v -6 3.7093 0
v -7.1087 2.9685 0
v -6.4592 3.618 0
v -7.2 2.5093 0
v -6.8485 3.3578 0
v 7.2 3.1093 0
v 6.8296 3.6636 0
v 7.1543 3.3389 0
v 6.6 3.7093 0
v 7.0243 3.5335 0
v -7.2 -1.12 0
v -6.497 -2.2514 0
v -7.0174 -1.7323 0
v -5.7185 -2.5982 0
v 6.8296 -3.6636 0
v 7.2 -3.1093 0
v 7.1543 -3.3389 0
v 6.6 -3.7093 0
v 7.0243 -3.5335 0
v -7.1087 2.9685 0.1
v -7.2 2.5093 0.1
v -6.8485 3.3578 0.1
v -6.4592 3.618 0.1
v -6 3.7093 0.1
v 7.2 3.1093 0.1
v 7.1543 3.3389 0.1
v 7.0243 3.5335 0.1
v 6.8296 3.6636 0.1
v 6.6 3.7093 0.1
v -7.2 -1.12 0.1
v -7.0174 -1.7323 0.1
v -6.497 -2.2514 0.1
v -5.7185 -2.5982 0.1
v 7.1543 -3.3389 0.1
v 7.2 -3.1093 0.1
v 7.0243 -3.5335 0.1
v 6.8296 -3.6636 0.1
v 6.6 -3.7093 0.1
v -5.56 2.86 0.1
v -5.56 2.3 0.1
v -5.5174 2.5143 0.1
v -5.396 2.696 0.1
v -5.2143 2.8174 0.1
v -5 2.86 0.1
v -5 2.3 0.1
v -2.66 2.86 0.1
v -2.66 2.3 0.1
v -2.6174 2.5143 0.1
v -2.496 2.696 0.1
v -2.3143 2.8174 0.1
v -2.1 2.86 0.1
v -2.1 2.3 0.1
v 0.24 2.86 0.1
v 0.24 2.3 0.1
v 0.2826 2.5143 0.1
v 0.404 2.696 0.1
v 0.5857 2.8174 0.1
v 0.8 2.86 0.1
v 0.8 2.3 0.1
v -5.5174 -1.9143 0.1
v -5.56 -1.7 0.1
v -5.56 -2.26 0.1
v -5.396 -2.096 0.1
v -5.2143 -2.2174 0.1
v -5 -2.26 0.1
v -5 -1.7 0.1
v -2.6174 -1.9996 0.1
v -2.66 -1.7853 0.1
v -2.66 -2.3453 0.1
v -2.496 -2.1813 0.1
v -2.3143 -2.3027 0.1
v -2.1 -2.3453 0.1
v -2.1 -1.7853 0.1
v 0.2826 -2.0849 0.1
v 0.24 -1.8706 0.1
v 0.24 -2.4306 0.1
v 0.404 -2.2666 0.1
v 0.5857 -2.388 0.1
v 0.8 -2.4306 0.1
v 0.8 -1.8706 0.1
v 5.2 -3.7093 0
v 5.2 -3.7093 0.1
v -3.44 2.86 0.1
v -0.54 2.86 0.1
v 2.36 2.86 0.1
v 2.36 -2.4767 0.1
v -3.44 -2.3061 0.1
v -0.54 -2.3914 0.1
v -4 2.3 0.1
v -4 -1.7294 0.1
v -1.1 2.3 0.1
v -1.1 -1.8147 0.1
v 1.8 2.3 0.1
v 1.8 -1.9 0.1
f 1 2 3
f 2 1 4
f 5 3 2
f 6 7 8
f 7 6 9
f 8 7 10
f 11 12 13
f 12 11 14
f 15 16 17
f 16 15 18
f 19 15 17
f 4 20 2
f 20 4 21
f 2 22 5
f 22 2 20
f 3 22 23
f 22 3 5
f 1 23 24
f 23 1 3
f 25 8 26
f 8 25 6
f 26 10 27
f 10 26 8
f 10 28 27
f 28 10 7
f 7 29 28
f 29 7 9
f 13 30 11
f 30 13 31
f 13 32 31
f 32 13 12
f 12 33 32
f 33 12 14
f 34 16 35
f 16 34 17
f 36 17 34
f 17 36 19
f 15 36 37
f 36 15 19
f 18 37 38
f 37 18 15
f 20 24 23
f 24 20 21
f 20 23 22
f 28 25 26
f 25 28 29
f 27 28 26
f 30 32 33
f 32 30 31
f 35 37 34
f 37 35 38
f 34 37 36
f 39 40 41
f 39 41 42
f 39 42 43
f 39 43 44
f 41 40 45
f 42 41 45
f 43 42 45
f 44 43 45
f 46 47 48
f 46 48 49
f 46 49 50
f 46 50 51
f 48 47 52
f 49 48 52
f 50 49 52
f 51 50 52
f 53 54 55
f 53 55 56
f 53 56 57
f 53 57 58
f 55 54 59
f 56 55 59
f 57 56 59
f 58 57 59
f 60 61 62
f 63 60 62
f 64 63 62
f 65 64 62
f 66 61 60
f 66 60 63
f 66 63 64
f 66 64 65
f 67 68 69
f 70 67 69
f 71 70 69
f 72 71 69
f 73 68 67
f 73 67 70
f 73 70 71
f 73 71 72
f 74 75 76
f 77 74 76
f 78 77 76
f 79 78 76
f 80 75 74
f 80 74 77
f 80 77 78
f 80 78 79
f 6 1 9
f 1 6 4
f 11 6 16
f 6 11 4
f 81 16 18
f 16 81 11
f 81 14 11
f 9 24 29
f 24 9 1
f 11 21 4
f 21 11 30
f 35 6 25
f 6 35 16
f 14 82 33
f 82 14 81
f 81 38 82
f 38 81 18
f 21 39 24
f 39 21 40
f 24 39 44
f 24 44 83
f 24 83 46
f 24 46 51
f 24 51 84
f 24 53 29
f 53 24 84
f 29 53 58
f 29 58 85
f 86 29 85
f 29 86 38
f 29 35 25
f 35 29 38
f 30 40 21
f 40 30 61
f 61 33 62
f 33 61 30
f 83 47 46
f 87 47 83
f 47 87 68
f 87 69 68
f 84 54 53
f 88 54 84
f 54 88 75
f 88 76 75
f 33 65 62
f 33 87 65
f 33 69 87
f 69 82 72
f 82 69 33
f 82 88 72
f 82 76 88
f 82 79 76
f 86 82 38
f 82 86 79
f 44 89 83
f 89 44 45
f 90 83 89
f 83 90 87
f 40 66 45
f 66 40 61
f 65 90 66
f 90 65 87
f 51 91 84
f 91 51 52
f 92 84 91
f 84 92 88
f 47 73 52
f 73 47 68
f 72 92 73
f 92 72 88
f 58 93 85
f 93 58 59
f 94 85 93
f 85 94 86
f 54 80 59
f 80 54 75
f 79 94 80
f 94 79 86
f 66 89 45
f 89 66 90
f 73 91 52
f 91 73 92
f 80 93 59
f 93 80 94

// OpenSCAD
// file: ../p/3-16cyli.scad
use <../lib.scad>
function ldraw_lib__3_16cyli() = [
// 0 Cylinder 0.1875
// 0 Name: 3-16cyli.dat
// 0 Author: Mark Kennedy [mkennedy]
// 0 !LDRAW_ORG Primitive UPDATE 2005-01
// 0 !LICENSE Licensed under CC BY 4.0 : see CAreadme.txt
// 
// 0 BFC CERTIFY CCW
  [0,"BFC","CERTIFY"],
  [0,"BFC","CCW"],
// 
// 0 !HISTORY 2004-03-02 [PTadmin] Official Update 2004-01
// 0 !HISTORY 2004-12-11 [nielsk] Recreated using Primitive Generator, Edge lines fixed, BFC changed to CCW
// 0 !HISTORY 2005-12-28 [PTadmin] Official Update 2005-01
// 0 !HISTORY 2007-06-24 [PTadmin] Header formatted for Contributor Agreement
// 0 !HISTORY 2008-07-01 [PTadmin] Official Update 2008-01
// 
// 
// 4 16 .9239 1 .3827 .9239 0 .3827 1 0 0 1 1 0
  [4,16,.9239,1,.3827,.9239,0,.3827,1,0,0,1,1,0],
// 4 16 .7071 1 .7071 .7071 0 .7071 .9239 0 .3827 .9239 1 .3827
  [4,16,.7071,1,.7071,.7071,0,.7071,.9239,0,.3827,.9239,1,.3827],
// 4 16 .3827 1 .9239 .3827 0 .9239 .7071 0 .7071 .7071 1 .7071
  [4,16,.3827,1,.9239,.3827,0,.9239,.7071,0,.7071,.7071,1,.7071],
// 5 24 1 1 0 1 0 0 1 1 -.4142 .9239 1 .3827
  [5,24,1,1,0,1,0,0,1,1,-.4142,.9239,1,.3827],
// 5 24 .9239 1 .3827 .9239 0 .3827 1 1 0 .7071 1 .7071
  [5,24,.9239,1,.3827,.9239,0,.3827,1,1,0,.7071,1,.7071],
// 5 24 .7071 1 .7071 .7071 0 .7071 .9239 1 .3827 .3827 1 .9239
  [5,24,.7071,1,.7071,.7071,0,.7071,.9239,1,.3827,.3827,1,.9239],
// 5 24 .3827 1 .9239 .3827 0 .9239 .7071 1 .7071 0 1 1.0824
  [5,24,.3827,1,.9239,.3827,0,.9239,.7071,1,.7071,0,1,1.0824],
// 0
];
module ldraw_lib__3_16cyli(step=0, col=false, unit=2/5, alt=false, line=0.2, solid=!$preview)
    makepoly(ldraw_lib__3_16cyli(), step=step, col=col, unit=unit, alt=alt, line=line, solid=solid);
ldraw_lib__3_16cyli(line=0.2);
// file: ../p/3-16chrd.scad
use <../lib.scad>
function ldraw_lib__3_16chrd() = [
// 0 Chord 0.1875
// 0 Name: 3-16chrd.dat
// 0 Author: Niels Karsdorp [nielsk]
// 0 !LDRAW_ORG Primitive UPDATE 2009-01
// 0 !LICENSE Licensed under CC BY 4.0 : see CAreadme.txt
// 
// 0 BFC CERTIFY CCW
  [0,"BFC","CERTIFY"],
  [0,"BFC","CCW"],
// 
// 0 !HISTORY 2009-05-02 [PTadmin] Official Update 2009-01
// 
// 
// 4 16 1 0 0 0.9239 0 0.3827 0.7071 0 0.7071 0.3827 0 0.9239
  [4,16,1,0,0,0.9239,0,0.3827,0.7071,0,0.7071,0.3827,0,0.9239],
// 0
// 
];
module ldraw_lib__3_16chrd(step=0, col=false, unit=2/5, alt=false, line=0.2, solid=!$preview)
    makepoly(ldraw_lib__3_16chrd(), step=step, col=col, unit=unit, alt=alt, line=line, solid=solid);
ldraw_lib__3_16chrd(line=0.2);
// file: ../p/1-4ndis.scad
use <../lib.scad>
function ldraw_lib__1_4ndis() = [
// 0 Disc Negative 0.25
// 0 Name: 1-4ndis.dat
// 0 Author: James Jessiman
// 0 !LDRAW_ORG Primitive UPDATE 2012-01
// 0 !LICENSE Licensed under CC BY 4.0 : see CAreadme.txt
// 
// 0 BFC CERTIFY CCW
  [0,"BFC","CERTIFY"],
  [0,"BFC","CCW"],
// 
// 0 !HISTORY 2002-03-23 [sbliss] Added BFC Statement
// 0 !HISTORY 2002-04-25 [PTadmin] Official Update 2002-02
// 0 !HISTORY 2007-06-22 [PTadmin] Header formatted for Contributor Agreement
// 0 !HISTORY 2008-07-01 [PTadmin] Official Update 2008-01
// 0 !HISTORY 2012-02-16 [Philo] Changed to CCW
// 0 !HISTORY 2012-03-30 [PTadmin] Official Update 2012-01
// 
// 
// 3 16 0.9239 0 0.3827 1 0 0 1 0 1
  [3,16,0.9239,0,0.3827,1,0,0,1,0,1],
// 3 16 0.7071 0 0.7071 0.9239 0 0.3827 1 0 1
  [3,16,0.7071,0,0.7071,0.9239,0,0.3827,1,0,1],
// 3 16 0.3827 0 0.9239 0.7071 0 0.7071 1 0 1
  [3,16,0.3827,0,0.9239,0.7071,0,0.7071,1,0,1],
// 3 16 0 0 1 0.3827 0 0.9239 1 0 1
  [3,16,0,0,1,0.3827,0,0.9239,1,0,1],
];
module ldraw_lib__1_4ndis(step=0, col=false, unit=2/5, alt=false, line=0.2, solid=!$preview)
    makepoly(ldraw_lib__1_4ndis(), step=step, col=col, unit=unit, alt=alt, line=line, solid=solid);
ldraw_lib__1_4ndis(line=0.2);
// file: ../p/1-4disc.scad
use <../lib.scad>
function ldraw_lib__1_4disc() = [
// 0 Disc 0.25
// 0 Name: 1-4disc.dat
// 0 Author: James Jessiman
// 0 !LDRAW_ORG Primitive UPDATE 2002-02
// 0 !LICENSE Licensed under CC BY 4.0 : see CAreadme.txt
// 
// 0 BFC CERTIFY CCW
  [0,"BFC","CERTIFY"],
  [0,"BFC","CCW"],
// 
// 0 !HISTORY 2002-03-23 [sbliss] Added BFC statement.
// 0 !HISTORY 2002-04-25 [PTadmin] Official Update 2002-02
// 0 !HISTORY 2007-06-22 [PTadmin] Header formatted for Contributor Agreement
// 0 !HISTORY 2008-07-01 [PTadmin] Official Update 2008-01
// 
// 
// 3 16 0 0 0 1 0 0 0.9239 0 0.3827
  [3,16,0,0,0,1,0,0,0.9239,0,0.3827],
// 3 16 0 0 0 0.9239 0 0.3827 0.7071 0 0.7071
  [3,16,0,0,0,0.9239,0,0.3827,0.7071,0,0.7071],
// 3 16 0 0 0 0.7071 0 0.7071 0.3827 0 0.9239
  [3,16,0,0,0,0.7071,0,0.7071,0.3827,0,0.9239],
// 3 16 0 0 0 0.3827 0 0.9239 0 0 1
  [3,16,0,0,0,0.3827,0,0.9239,0,0,1],
// 0
];
module ldraw_lib__1_4disc(step=0, col=false, unit=2/5, alt=false, line=0.2, solid=!$preview)
    makepoly(ldraw_lib__1_4disc(), step=step, col=col, unit=unit, alt=alt, line=line, solid=solid);
ldraw_lib__1_4disc(line=0.2);
// file: ../p/1-4cyli.scad
use <../lib.scad>
function ldraw_lib__1_4cyli() = [
// 0 Cylinder 0.25
// 0 Name: 1-4cyli.dat
// 0 Author: James Jessiman
// 0 !LDRAW_ORG Primitive UPDATE 2012-01
// 0 !LICENSE Licensed under CC BY 4.0 : see CAreadme.txt
// 
// 0 BFC CERTIFY CCW
  [0,"BFC","CERTIFY"],
  [0,"BFC","CCW"],
// 
// 0 !HISTORY 2002-03-23 [sbliss] Added BFC statement.
// 0 !HISTORY 2002-04-25 [PTadmin] Official Update 2002-02
// 0 !HISTORY 2007-06-22 [PTadmin] Header formatted for Contributor Agreement
// 0 !HISTORY 2008-07-01 [PTadmin] Official Update 2008-01
// 0 !HISTORY 2012-02-16 [Philo] Changed to CCW
// 0 !HISTORY 2012-03-30 [PTadmin] Official Update 2012-01
// 
// 
// 4 16 1 1 0 0.9239 1 0.3827 0.9239 0 0.3827 1 0 0
  [4,16,1,1,0,0.9239,1,0.3827,0.9239,0,0.3827,1,0,0],
// 5 24 1 0 0 1 1 0 0.9239 0 0.3827 1 0 -1
  [5,24,1,0,0,1,1,0,0.9239,0,0.3827,1,0,-1],
// 4 16 0.9239 1 0.3827 0.7071 1 0.7071 0.7071 0 0.7071 0.9239 0 0.3827
  [4,16,0.9239,1,0.3827,0.7071,1,0.7071,0.7071,0,0.7071,0.9239,0,0.3827],
// 5 24 0.9239 0 0.3827 0.9239 1 0.3827 0.7071 0 0.7071 1 0 0
  [5,24,0.9239,0,0.3827,0.9239,1,0.3827,0.7071,0,0.7071,1,0,0],
// 4 16 0.7071 1 0.7071 0.3827 1 0.9239 0.3827 0 0.9239 0.7071 0 0.7071
  [4,16,0.7071,1,0.7071,0.3827,1,0.9239,0.3827,0,0.9239,0.7071,0,0.7071],
// 5 24 0.7071 0 0.7071 0.7071 1 0.7071 0.3827 0 0.9239 0.9239 0 0.3827
  [5,24,0.7071,0,0.7071,0.7071,1,0.7071,0.3827,0,0.9239,0.9239,0,0.3827],
// 4 16 0.3827 1 0.9239 0 1 1 0 0 1 0.3827 0 0.9239
  [4,16,0.3827,1,0.9239,0,1,1,0,0,1,0.3827,0,0.9239],
// 5 24 0.3827 0 0.9239 0.3827 1 0.9239 0 0 1 0.7071 0 0.7071
  [5,24,0.3827,0,0.9239,0.3827,1,0.9239,0,0,1,0.7071,0,0.7071],
// 5 24 0 0 1 0 1 1 0.3827 0 0.9239 -1 0 1
  [5,24,0,0,1,0,1,1,0.3827,0,0.9239,-1,0,1],
];
module ldraw_lib__1_4cyli(step=0, col=false, unit=2/5, alt=false, line=0.2, solid=!$preview)
    makepoly(ldraw_lib__1_4cyli(), step=step, col=col, unit=unit, alt=alt, line=line, solid=solid);
ldraw_lib__1_4cyli(line=0.2);
// file: ../p/1-4chrd.scad
use <../lib.scad>
function ldraw_lib__1_4chrd() = [
// 0 Chord 0.25
// 0 Name: 1-4chrd.dat
// 0 Author: Max Martin Richter [MMR1988]
// 0 !LDRAW_ORG Primitive UPDATE 2023-05
// 0 !LICENSE Licensed under CC BY 4.0 : see CAreadme.txt
// 
// 0 BFC CERTIFY CCW
  [0,"BFC","CERTIFY"],
  [0,"BFC","CCW"],
// 
// 0 !HISTORY 2004-04-22 [PTadmin] Official Update 2004-02
// 0 !HISTORY 2007-10-09 [PTadmin] Header formatted for Contributor Agreement
// 0 !HISTORY 2008-07-01 [PTadmin] Official Update 2008-01
// 0 !HISTORY 2012-08-02 [MMR1988] Re-creation with PrimGen2 and Rectifier
// 0 !HISTORY 2012-08-09 [PTadmin] Official Update 2012-02
// 0 !HISTORY 2023-10-27 [OrionP] Change author to MMR1988 from hafhead
// 0 !HISTORY 2023-10-31 [OrionP] Official Update 2023-05
// 
// 4 16 0.9239 0 0.3827 0.3827 0 0.9239 0 0 1 1 0 0
  [4,16,0.9239,0,0.3827,0.3827,0,0.9239,0,0,1,1,0,0],
// 3 16 0.7071 0 0.7071 0.3827 0 0.9239 0.9239 0 0.3827
  [3,16,0.7071,0,0.7071,0.3827,0,0.9239,0.9239,0,0.3827],
];
module ldraw_lib__1_4chrd(step=0, col=false, unit=2/5, alt=false, line=0.2, solid=!$preview)
    makepoly(ldraw_lib__1_4chrd(), step=step, col=col, unit=unit, alt=alt, line=line, solid=solid);
ldraw_lib__1_4chrd(line=0.2);
// main file
use <../lib.scad>
use <../p/1-4chrd.scad>
use <../p/1-4cyli.scad>
use <../p/1-4disc.scad>
use <../p/1-4ndis.scad>
use <../p/3-16chrd.scad>
use <../p/3-16cyli.scad>
function ldraw_lib__6141955m() = [
// 0 Sticker  1 x  1.8 with Red Taillamp on Black Background Left
// 0 Name: 6141955m.dat
// 0 Author: Massimo Maso [Sirio]
// 0 !LDRAW_ORG Part UPDATE 2024-07
// 0 !LICENSE Licensed under CC BY 4.0 : see CAreadme.txt
// 
// 0 BFC CERTIFY CCW
  [0,"BFC","CERTIFY"],
  [0,"BFC","CCW"],
// 
// 0 !KEYWORDS Ford, GT, Mustang, Set 75871, Speed Champions
// 
// 0 !HISTORY 2024-08-26 [OrionP] Official Update 2024-07
// 
// 
// 0 // Primitives
// 1 16 -15 0 6.2732 -3 0 0 0 -1 0 0 0 3 1-4chrd.dat
  [1,16,-15,0,6.2732,-3,0,0,0,-1,0,0,0,3, ldraw_lib__1_4chrd()],
// 1 16 16.5 0 7.7732 1.5 0 0 0 -1 0 0 0 1.5 1-4chrd.dat
  [1,16,16.5,0,7.7732,1.5,0,0,0,-1,0,0,0,1.5, ldraw_lib__1_4chrd()],
// 1 16 -12 0 -2.8 -6 0 0 0 -1 0 0 0 -4 3-16chrd.dat
  [1,16,-12,0,-2.8,-6,0,0,0,-1,0,0,0,-4, ldraw_lib__3_16chrd()],
// 1 16 16.5 0 -7.7732 1.5 0 0 0 -1 0 0 0 -1.5 1-4chrd.dat
  [1,16,16.5,0,-7.7732,1.5,0,0,0,-1,0,0,0,-1.5, ldraw_lib__1_4chrd()],
// 1 16 -15 0 6.2732 -3 0 0 0 -.25 0 0 0 3 1-4cyli.dat
  [1,16,-15,0,6.2732,-3,0,0,0,-.25,0,0,0,3, ldraw_lib__1_4cyli()],
// 1 16 16.5 0 7.7732 1.5 0 0 0 -.25 0 0 0 1.5 1-4cyli.dat
  [1,16,16.5,0,7.7732,1.5,0,0,0,-.25,0,0,0,1.5, ldraw_lib__1_4cyli()],
// 1 16 -12 0 -2.8 -6 0 0 0 -.25 0 0 0 -4 3-16cyli.dat
  [1,16,-12,0,-2.8,-6,0,0,0,-.25,0,0,0,-4, ldraw_lib__3_16cyli()],
// 1 16 16.5 0 -7.7732 1.5 0 0 0 -.25 0 0 0 -1.5 1-4cyli.dat
  [1,16,16.5,0,-7.7732,1.5,0,0,0,-.25,0,0,0,-1.5, ldraw_lib__1_4cyli()],
// 1 0 -15 -.25 6.2732 -3 0 0 0 1 0 0 0 3 1-4chrd.dat
  [1,0,-15,-.25,6.2732,-3,0,0,0,1,0,0,0,3, ldraw_lib__1_4chrd()],
// 1 0 16.5 -.25 7.7732 1.5 0 0 0 1 0 0 0 1.5 1-4chrd.dat
  [1,0,16.5,-.25,7.7732,1.5,0,0,0,1,0,0,0,1.5, ldraw_lib__1_4chrd()],
// 1 0 -12 -.25 -2.8 -6 0 0 0 1 0 0 0 -4 3-16chrd.dat
  [1,0,-12,-.25,-2.8,-6,0,0,0,1,0,0,0,-4, ldraw_lib__3_16chrd()],
// 1 0 16.5 -.25 -7.7732 1.5 0 0 0 1 0 0 0 -1.5 1-4chrd.dat
  [1,0,16.5,-.25,-7.7732,1.5,0,0,0,1,0,0,0,-1.5, ldraw_lib__1_4chrd()],
// 1 0 -12.5 -.25 5.75 -1.4 0 0 0 1 0 0 0 1.4 1-4ndis.dat
  [1,0,-12.5,-.25,5.75,-1.4,0,0,0,1,0,0,0,1.4, ldraw_lib__1_4ndis()],
// 1 320 -12.5 -.25 5.75 -1.4 0 0 0 1 0 0 0 1.4 1-4disc.dat
  [1,320,-12.5,-.25,5.75,-1.4,0,0,0,1,0,0,0,1.4, ldraw_lib__1_4disc()],
// 1 0 -5.25 -.25 5.75 -1.4 0 0 0 1 0 0 0 1.4 1-4ndis.dat
  [1,0,-5.25,-.25,5.75,-1.4,0,0,0,1,0,0,0,1.4, ldraw_lib__1_4ndis()],
// 1 320 -5.25 -.25 5.75 -1.4 0 0 0 1 0 0 0 1.4 1-4disc.dat
  [1,320,-5.25,-.25,5.75,-1.4,0,0,0,1,0,0,0,1.4, ldraw_lib__1_4disc()],
// 1 0 2 -.25 5.75 -1.4 0 0 0 1 0 0 0 1.4 1-4ndis.dat
  [1,0,2,-.25,5.75,-1.4,0,0,0,1,0,0,0,1.4, ldraw_lib__1_4ndis()],
// 1 320 2 -.25 5.75 -1.4 0 0 0 1 0 0 0 1.4 1-4disc.dat
  [1,320,2,-.25,5.75,-1.4,0,0,0,1,0,0,0,1.4, ldraw_lib__1_4disc()],
// 1 0 -12.5 -.25 -4.25 -1.4 0 0 0 1 0 0 0 -1.4 1-4ndis.dat
  [1,0,-12.5,-.25,-4.25,-1.4,0,0,0,1,0,0,0,-1.4, ldraw_lib__1_4ndis()],
// 1 320 -12.5 -.25 -4.25 -1.4 0 0 0 1 0 0 0 -1.4 1-4disc.dat
  [1,320,-12.5,-.25,-4.25,-1.4,0,0,0,1,0,0,0,-1.4, ldraw_lib__1_4disc()],
// 1 0 -5.25 -.25 -4.4632 -1.4 0 0 0 1 0 0 0 -1.4 1-4ndis.dat
  [1,0,-5.25,-.25,-4.4632,-1.4,0,0,0,1,0,0,0,-1.4, ldraw_lib__1_4ndis()],
// 1 320 -5.25 -.25 -4.4632 -1.4 0 0 0 1 0 0 0 -1.4 1-4disc.dat
  [1,320,-5.25,-.25,-4.4632,-1.4,0,0,0,1,0,0,0,-1.4, ldraw_lib__1_4disc()],
// 1 0 2 -.25 -4.6765 -1.4 0 0 0 1 0 0 0 -1.4 1-4ndis.dat
  [1,0,2,-.25,-4.6765,-1.4,0,0,0,1,0,0,0,-1.4, ldraw_lib__1_4ndis()],
// 1 320 2 -.25 -4.6765 -1.4 0 0 0 1 0 0 0 -1.4 1-4disc.dat
  [1,320,2,-.25,-4.6765,-1.4,0,0,0,1,0,0,0,-1.4, ldraw_lib__1_4disc()],
// 0 // Bottom face
// 4 16 16.5 0 9.2732 18 0 7.7732 -18 0 6.2732 -15 0 9.2732
  [4,16,16.5,0,9.2732,18,0,7.7732,-18,0,6.2732,-15,0,9.2732],
// 4 16 18 0 7.7732 18 0 -7.7732 -18 0 -2.8 -18 0 6.2732
  [4,16,18,0,7.7732,18,0,-7.7732,-18,0,-2.8,-18,0,6.2732],
// 4 16 18 0 -7.7732 16.5 0 -9.2732 13 0 -9.2732 -18 0 -2.8
  [4,16,18,0,-7.7732,16.5,0,-9.2732,13,0,-9.2732,-18,0,-2.8],
// 3 16 13 0 -9.2732 -14.2962 0 -6.4956 -18 0 -2.8
  [3,16,13,0,-9.2732,-14.2962,0,-6.4956,-18,0,-2.8],
// 0 // Lateral face
// 4 16 -15 0 9.2732 -15 -.25 9.2732 16.5 -.25 9.2732 16.5 0 9.2732
  [4,16,-15,0,9.2732,-15,-.25,9.2732,16.5,-.25,9.2732,16.5,0,9.2732],
// 4 16 -18 0 6.2732 -18 0 -2.8 -18 -.25 -2.8 -18 -.25 6.2732
  [4,16,-18,0,6.2732,-18,0,-2.8,-18,-.25,-2.8,-18,-.25,6.2732],
// 4 16 18 -0.25 7.7732 18 -0.25 -7.7732 18 0 -7.7732 18 0 7.7732
  [4,16,18,-0.25,7.7732,18,-0.25,-7.7732,18,0,-7.7732,18,0,7.7732],
// 4 16 13 0 -9.2732 13 -.25 -9.2732 -14.2962 -.25 -6.4956 -14.2962 0 -6.4956
  [4,16,13,0,-9.2732,13,-.25,-9.2732,-14.2962,-.25,-6.4956,-14.2962,0,-6.4956],
// 4 16 13 0 -9.2732 16.5 0 -9.2732 16.5 -.25 -9.2732 13 -.25 -9.2732
  [4,16,13,0,-9.2732,16.5,0,-9.2732,16.5,-.25,-9.2732,13,-.25,-9.2732],
// 0 // Top face
// 0 // Black faces
// 4 0 -15 -.25 9.2732 -18 -.25 6.2732 -13.9 -.25 5.75 -13.9 -.25 7.15
  [4,0,-15,-.25,9.2732,-18,-.25,6.2732,-13.9,-.25,5.75,-13.9,-.25,7.15],
// 3 0 -15 -.25 9.2732 -13.9 -.25 7.15 -12.5 -.25 7.15
  [3,0,-15,-.25,9.2732,-13.9,-.25,7.15,-12.5,-.25,7.15],
// 3 0 -15 -.25 9.2732 -12.5 -.25 7.15 -8.6 -.25 7.15
  [3,0,-15,-.25,9.2732,-12.5,-.25,7.15,-8.6,-.25,7.15],
// 3 0 -15 -.25 9.2732 -8.6 -.25 7.15 -6.65 -.25 7.15
  [3,0,-15,-.25,9.2732,-8.6,-.25,7.15,-6.65,-.25,7.15],
// 3 0 -15 -.25 9.2732 -6.65 -.25 7.15 -5.25 -.25 7.15
  [3,0,-15,-.25,9.2732,-6.65,-.25,7.15,-5.25,-.25,7.15],
// 3 0 -15 -.25 9.2732 -5.25 -.25 7.15 -1.35 -.25 7.15
  [3,0,-15,-.25,9.2732,-5.25,-.25,7.15,-1.35,-.25,7.15],
// 4 0 -15 -.25 9.2732 -1.35 -.25 7.15 .6 -.25 7.15 16.5 -.25 9.2732
  [4,0,-15,-.25,9.2732,-1.35,-.25,7.15,.6,-.25,7.15,16.5,-.25,9.2732],
// 3 0 16.5 -.25 9.2732 .6 -.25 7.15 2 -.25 7.15
  [3,0,16.5,-.25,9.2732,.6,-.25,7.15,2,-.25,7.15],
// 3 0 16.5 -.25 9.2732 2 -.25 7.15 5.9 -.25 7.15
  [3,0,16.5,-.25,9.2732,2,-.25,7.15,5.9,-.25,7.15],
// 4 0 16.5 -.25 9.2732 5.9 -.25 7.15 5.9 -.25 -6.1918 16.5 -.25 -9.2732
  [4,0,16.5,-.25,9.2732,5.9,-.25,7.15,5.9,-.25,-6.1918,16.5,-.25,-9.2732],
// 4 0 16.5 -.25 9.2732 16.5 -.25 -9.2732 18 -.25 -7.7732 18 -.25 7.7732
  [4,0,16.5,-.25,9.2732,16.5,-.25,-9.2732,18,-.25,-7.7732,18,-.25,7.7732],
// 4 0 -18 -.25 -2.8 -13.9 -.25 -4.25 -13.9 -.25 5.75 -18 -.25 6.2732
  [4,0,-18,-.25,-2.8,-13.9,-.25,-4.25,-13.9,-.25,5.75,-18,-.25,6.2732],
// 4 0 -13.9 -.25 -4.25 -18 -.25 -2.8 -14.2962 -.25 -6.4956 -13.9 -.25 -5.65
  [4,0,-13.9,-.25,-4.25,-18,-.25,-2.8,-14.2962,-.25,-6.4956,-13.9,-.25,-5.65],
// 3 0 -8.6 -.25 7.15 -6.65 -.25 5.75 -6.65 -.25 7.15
  [3,0,-8.6,-.25,7.15,-6.65,-.25,5.75,-6.65,-.25,7.15],
// 4 0 -8.6 -.25 7.15 -8.6 -.25 -5.7653 -6.65 -.25 -4.4632 -6.65 -.25 5.75
  [4,0,-8.6,-.25,7.15,-8.6,-.25,-5.7653,-6.65,-.25,-4.4632,-6.65,-.25,5.75],
// 3 0 -8.6 -.25 -5.7653 -6.65 -.25 -5.8632 -6.65 -.25 -4.4632
  [3,0,-8.6,-.25,-5.7653,-6.65,-.25,-5.8632,-6.65,-.25,-4.4632],
// 3 0 -1.35 -.25 7.15 .6 -.25 5.75 .6 -.25 7.15
  [3,0,-1.35,-.25,7.15,.6,-.25,5.75,.6,-.25,7.15],
// 4 0 -1.35 -.25 7.15 -1.35 -.25 -5.9785 .6 -.25 -4.6765 .6 -.25 5.75
  [4,0,-1.35,-.25,7.15,-1.35,-.25,-5.9785,.6,-.25,-4.6765,.6,-.25,5.75],
// 3 0 -1.35 -.25 -5.9785 .6 -.25 -6.0765 .6 -.25 -4.6765
  [3,0,-1.35,-.25,-5.9785,.6,-.25,-6.0765,.6,-.25,-4.6765],
// 3 0 -14.2962 -.25 -6.4956 -12.5 -.25 -5.65 -13.9 -.25 -5.65
  [3,0,-14.2962,-.25,-6.4956,-12.5,-.25,-5.65,-13.9,-.25,-5.65],
// 3 0 -14.2962 -.25 -6.4956 -8.6 -.25 -5.7653 -12.5 -.25 -5.65
  [3,0,-14.2962,-.25,-6.4956,-8.6,-.25,-5.7653,-12.5,-.25,-5.65],
// 3 0 -14.2962 -.25 -6.4956 -6.65 -.25 -5.8632 -8.6 -.25 -5.7653
  [3,0,-14.2962,-.25,-6.4956,-6.65,-.25,-5.8632,-8.6,-.25,-5.7653],
// 4 0 -14.2962 -.25 -6.4956 13 -.25 -9.2732 -5.25 -.25 -5.8632 -6.65 -.25 -5.8632
  [4,0,-14.2962,-.25,-6.4956,13,-.25,-9.2732,-5.25,-.25,-5.8632,-6.65,-.25,-5.8632],
// 3 0 13 -.25 -9.2732 -1.35 -.25 -5.9785 -5.25 -.25 -5.8632
  [3,0,13,-.25,-9.2732,-1.35,-.25,-5.9785,-5.25,-.25,-5.8632],
// 3 0 13 -.25 -9.2732 .6 -.25 -6.0765 -1.35 -.25 -5.9785
  [3,0,13,-.25,-9.2732,.6,-.25,-6.0765,-1.35,-.25,-5.9785],
// 3 0 13 -.25 -9.2732 2 -.25 -6.0765 .6 -.25 -6.0765
  [3,0,13,-.25,-9.2732,2,-.25,-6.0765,.6,-.25,-6.0765],
// 4 0 13 -.25 -9.2732 16.5 -.25 -9.2732 5.9 -.25 -6.1918 2 -.25 -6.0765
  [4,0,13,-.25,-9.2732,16.5,-.25,-9.2732,5.9,-.25,-6.1918,2,-.25,-6.0765],
// 0 // Dark red faces
// 4 320 -10 -.25 5.75 -8.6 -.25 7.15 -12.5 -.25 7.15 -12.5 -.25 5.75
  [4,320,-10,-.25,5.75,-8.6,-.25,7.15,-12.5,-.25,7.15,-12.5,-.25,5.75],
// 4 320 -10 -.25 5.75 -10 -.25 -4.3235 -8.6 -.25 -5.7653 -8.6 -.25 7.15
  [4,320,-10,-.25,5.75,-10,-.25,-4.3235,-8.6,-.25,-5.7653,-8.6,-.25,7.15],
// 4 320 -12.5 -.25 -4.25 -12.5 -.25 5.75 -13.9 -.25 5.75 -13.9 -.25 -4.25
  [4,320,-12.5,-.25,-4.25,-12.5,-.25,5.75,-13.9,-.25,5.75,-13.9,-.25,-4.25],
// 4 320 -12.5 -.25 -4.25 -12.5 -.25 -5.65 -8.6 -.25 -5.7653 -10 -.25 -4.3235
  [4,320,-12.5,-.25,-4.25,-12.5,-.25,-5.65,-8.6,-.25,-5.7653,-10,-.25,-4.3235],
// 4 320 -2.75 -.25 5.75 -1.35 -.25 7.15 -5.25 -.25 7.15 -5.25 -.25 5.75
  [4,320,-2.75,-.25,5.75,-1.35,-.25,7.15,-5.25,-.25,7.15,-5.25,-.25,5.75],
// 4 320 -2.75 -.25 5.75 -2.75 -.25 -4.5368 -1.35 -.25 -5.9785 -1.35 -.25 7.15
  [4,320,-2.75,-.25,5.75,-2.75,-.25,-4.5368,-1.35,-.25,-5.9785,-1.35,-.25,7.15],
// 4 320 -5.25 -.25 -4.4632 -5.25 -.25 5.75 -6.65 -.25 5.75 -6.65 -.25 -4.4632
  [4,320,-5.25,-.25,-4.4632,-5.25,-.25,5.75,-6.65,-.25,5.75,-6.65,-.25,-4.4632],
// 4 320 -5.25 -.25 -4.4632 -5.25 -.25 -5.8632 -1.35 -.25 -5.9785 -2.75 -.25 -4.5368
  [4,320,-5.25,-.25,-4.4632,-5.25,-.25,-5.8632,-1.35,-.25,-5.9785,-2.75,-.25,-4.5368],
// 4 320 4.5 -.25 5.75 5.9 -.25 7.15 2 -.25 7.15 2 -.25 5.75
  [4,320,4.5,-.25,5.75,5.9,-.25,7.15,2,-.25,7.15,2,-.25,5.75],
// 4 320 4.5 -.25 5.75 4.5 -.25 -4.75 5.9 -.25 -6.1918 5.9 -.25 7.15
  [4,320,4.5,-.25,5.75,4.5,-.25,-4.75,5.9,-.25,-6.1918,5.9,-.25,7.15],
// 4 320 2 -.25 -4.6765 2 -.25 5.75 .6 -.25 5.75 .6 -.25 -4.6765
  [4,320,2,-.25,-4.6765,2,-.25,5.75,.6,-.25,5.75,.6,-.25,-4.6765],
// 4 320 2 -.25 -4.6765 2 -.25 -6.0765 5.9 -.25 -6.1918 4.5 -.25 -4.75
  [4,320,2,-.25,-4.6765,2,-.25,-6.0765,5.9,-.25,-6.1918,4.5,-.25,-4.75],
// 0 // Red faces
// 4 4 -10 -.25 5.75 -12.5 -.25 5.75 -12.5 -.25 -4.25 -10 -.25 -4.3235
  [4,4,-10,-.25,5.75,-12.5,-.25,5.75,-12.5,-.25,-4.25,-10,-.25,-4.3235],
// 4 4 -2.75 -.25 5.75 -5.25 -.25 5.75 -5.25 -.25 -4.4632 -2.75 -.25 -4.5368
  [4,4,-2.75,-.25,5.75,-5.25,-.25,5.75,-5.25,-.25,-4.4632,-2.75,-.25,-4.5368],
// 4 4 4.5 -.25 5.75 2 -.25 5.75 2 -.25 -4.6765 4.5 -.25 -4.75
  [4,4,4.5,-.25,5.75,2,-.25,5.75,2,-.25,-4.6765,4.5,-.25,-4.75],
];
module ldraw_lib__6141955m(step=0, col=false, unit=2/5, alt=false, line=0.2, solid=!$preview)
    makepoly(ldraw_lib__6141955m(), step=step, col=col, unit=unit, alt=alt, line=line, solid=solid);
ldraw_lib__6141955m(line=0.2);
